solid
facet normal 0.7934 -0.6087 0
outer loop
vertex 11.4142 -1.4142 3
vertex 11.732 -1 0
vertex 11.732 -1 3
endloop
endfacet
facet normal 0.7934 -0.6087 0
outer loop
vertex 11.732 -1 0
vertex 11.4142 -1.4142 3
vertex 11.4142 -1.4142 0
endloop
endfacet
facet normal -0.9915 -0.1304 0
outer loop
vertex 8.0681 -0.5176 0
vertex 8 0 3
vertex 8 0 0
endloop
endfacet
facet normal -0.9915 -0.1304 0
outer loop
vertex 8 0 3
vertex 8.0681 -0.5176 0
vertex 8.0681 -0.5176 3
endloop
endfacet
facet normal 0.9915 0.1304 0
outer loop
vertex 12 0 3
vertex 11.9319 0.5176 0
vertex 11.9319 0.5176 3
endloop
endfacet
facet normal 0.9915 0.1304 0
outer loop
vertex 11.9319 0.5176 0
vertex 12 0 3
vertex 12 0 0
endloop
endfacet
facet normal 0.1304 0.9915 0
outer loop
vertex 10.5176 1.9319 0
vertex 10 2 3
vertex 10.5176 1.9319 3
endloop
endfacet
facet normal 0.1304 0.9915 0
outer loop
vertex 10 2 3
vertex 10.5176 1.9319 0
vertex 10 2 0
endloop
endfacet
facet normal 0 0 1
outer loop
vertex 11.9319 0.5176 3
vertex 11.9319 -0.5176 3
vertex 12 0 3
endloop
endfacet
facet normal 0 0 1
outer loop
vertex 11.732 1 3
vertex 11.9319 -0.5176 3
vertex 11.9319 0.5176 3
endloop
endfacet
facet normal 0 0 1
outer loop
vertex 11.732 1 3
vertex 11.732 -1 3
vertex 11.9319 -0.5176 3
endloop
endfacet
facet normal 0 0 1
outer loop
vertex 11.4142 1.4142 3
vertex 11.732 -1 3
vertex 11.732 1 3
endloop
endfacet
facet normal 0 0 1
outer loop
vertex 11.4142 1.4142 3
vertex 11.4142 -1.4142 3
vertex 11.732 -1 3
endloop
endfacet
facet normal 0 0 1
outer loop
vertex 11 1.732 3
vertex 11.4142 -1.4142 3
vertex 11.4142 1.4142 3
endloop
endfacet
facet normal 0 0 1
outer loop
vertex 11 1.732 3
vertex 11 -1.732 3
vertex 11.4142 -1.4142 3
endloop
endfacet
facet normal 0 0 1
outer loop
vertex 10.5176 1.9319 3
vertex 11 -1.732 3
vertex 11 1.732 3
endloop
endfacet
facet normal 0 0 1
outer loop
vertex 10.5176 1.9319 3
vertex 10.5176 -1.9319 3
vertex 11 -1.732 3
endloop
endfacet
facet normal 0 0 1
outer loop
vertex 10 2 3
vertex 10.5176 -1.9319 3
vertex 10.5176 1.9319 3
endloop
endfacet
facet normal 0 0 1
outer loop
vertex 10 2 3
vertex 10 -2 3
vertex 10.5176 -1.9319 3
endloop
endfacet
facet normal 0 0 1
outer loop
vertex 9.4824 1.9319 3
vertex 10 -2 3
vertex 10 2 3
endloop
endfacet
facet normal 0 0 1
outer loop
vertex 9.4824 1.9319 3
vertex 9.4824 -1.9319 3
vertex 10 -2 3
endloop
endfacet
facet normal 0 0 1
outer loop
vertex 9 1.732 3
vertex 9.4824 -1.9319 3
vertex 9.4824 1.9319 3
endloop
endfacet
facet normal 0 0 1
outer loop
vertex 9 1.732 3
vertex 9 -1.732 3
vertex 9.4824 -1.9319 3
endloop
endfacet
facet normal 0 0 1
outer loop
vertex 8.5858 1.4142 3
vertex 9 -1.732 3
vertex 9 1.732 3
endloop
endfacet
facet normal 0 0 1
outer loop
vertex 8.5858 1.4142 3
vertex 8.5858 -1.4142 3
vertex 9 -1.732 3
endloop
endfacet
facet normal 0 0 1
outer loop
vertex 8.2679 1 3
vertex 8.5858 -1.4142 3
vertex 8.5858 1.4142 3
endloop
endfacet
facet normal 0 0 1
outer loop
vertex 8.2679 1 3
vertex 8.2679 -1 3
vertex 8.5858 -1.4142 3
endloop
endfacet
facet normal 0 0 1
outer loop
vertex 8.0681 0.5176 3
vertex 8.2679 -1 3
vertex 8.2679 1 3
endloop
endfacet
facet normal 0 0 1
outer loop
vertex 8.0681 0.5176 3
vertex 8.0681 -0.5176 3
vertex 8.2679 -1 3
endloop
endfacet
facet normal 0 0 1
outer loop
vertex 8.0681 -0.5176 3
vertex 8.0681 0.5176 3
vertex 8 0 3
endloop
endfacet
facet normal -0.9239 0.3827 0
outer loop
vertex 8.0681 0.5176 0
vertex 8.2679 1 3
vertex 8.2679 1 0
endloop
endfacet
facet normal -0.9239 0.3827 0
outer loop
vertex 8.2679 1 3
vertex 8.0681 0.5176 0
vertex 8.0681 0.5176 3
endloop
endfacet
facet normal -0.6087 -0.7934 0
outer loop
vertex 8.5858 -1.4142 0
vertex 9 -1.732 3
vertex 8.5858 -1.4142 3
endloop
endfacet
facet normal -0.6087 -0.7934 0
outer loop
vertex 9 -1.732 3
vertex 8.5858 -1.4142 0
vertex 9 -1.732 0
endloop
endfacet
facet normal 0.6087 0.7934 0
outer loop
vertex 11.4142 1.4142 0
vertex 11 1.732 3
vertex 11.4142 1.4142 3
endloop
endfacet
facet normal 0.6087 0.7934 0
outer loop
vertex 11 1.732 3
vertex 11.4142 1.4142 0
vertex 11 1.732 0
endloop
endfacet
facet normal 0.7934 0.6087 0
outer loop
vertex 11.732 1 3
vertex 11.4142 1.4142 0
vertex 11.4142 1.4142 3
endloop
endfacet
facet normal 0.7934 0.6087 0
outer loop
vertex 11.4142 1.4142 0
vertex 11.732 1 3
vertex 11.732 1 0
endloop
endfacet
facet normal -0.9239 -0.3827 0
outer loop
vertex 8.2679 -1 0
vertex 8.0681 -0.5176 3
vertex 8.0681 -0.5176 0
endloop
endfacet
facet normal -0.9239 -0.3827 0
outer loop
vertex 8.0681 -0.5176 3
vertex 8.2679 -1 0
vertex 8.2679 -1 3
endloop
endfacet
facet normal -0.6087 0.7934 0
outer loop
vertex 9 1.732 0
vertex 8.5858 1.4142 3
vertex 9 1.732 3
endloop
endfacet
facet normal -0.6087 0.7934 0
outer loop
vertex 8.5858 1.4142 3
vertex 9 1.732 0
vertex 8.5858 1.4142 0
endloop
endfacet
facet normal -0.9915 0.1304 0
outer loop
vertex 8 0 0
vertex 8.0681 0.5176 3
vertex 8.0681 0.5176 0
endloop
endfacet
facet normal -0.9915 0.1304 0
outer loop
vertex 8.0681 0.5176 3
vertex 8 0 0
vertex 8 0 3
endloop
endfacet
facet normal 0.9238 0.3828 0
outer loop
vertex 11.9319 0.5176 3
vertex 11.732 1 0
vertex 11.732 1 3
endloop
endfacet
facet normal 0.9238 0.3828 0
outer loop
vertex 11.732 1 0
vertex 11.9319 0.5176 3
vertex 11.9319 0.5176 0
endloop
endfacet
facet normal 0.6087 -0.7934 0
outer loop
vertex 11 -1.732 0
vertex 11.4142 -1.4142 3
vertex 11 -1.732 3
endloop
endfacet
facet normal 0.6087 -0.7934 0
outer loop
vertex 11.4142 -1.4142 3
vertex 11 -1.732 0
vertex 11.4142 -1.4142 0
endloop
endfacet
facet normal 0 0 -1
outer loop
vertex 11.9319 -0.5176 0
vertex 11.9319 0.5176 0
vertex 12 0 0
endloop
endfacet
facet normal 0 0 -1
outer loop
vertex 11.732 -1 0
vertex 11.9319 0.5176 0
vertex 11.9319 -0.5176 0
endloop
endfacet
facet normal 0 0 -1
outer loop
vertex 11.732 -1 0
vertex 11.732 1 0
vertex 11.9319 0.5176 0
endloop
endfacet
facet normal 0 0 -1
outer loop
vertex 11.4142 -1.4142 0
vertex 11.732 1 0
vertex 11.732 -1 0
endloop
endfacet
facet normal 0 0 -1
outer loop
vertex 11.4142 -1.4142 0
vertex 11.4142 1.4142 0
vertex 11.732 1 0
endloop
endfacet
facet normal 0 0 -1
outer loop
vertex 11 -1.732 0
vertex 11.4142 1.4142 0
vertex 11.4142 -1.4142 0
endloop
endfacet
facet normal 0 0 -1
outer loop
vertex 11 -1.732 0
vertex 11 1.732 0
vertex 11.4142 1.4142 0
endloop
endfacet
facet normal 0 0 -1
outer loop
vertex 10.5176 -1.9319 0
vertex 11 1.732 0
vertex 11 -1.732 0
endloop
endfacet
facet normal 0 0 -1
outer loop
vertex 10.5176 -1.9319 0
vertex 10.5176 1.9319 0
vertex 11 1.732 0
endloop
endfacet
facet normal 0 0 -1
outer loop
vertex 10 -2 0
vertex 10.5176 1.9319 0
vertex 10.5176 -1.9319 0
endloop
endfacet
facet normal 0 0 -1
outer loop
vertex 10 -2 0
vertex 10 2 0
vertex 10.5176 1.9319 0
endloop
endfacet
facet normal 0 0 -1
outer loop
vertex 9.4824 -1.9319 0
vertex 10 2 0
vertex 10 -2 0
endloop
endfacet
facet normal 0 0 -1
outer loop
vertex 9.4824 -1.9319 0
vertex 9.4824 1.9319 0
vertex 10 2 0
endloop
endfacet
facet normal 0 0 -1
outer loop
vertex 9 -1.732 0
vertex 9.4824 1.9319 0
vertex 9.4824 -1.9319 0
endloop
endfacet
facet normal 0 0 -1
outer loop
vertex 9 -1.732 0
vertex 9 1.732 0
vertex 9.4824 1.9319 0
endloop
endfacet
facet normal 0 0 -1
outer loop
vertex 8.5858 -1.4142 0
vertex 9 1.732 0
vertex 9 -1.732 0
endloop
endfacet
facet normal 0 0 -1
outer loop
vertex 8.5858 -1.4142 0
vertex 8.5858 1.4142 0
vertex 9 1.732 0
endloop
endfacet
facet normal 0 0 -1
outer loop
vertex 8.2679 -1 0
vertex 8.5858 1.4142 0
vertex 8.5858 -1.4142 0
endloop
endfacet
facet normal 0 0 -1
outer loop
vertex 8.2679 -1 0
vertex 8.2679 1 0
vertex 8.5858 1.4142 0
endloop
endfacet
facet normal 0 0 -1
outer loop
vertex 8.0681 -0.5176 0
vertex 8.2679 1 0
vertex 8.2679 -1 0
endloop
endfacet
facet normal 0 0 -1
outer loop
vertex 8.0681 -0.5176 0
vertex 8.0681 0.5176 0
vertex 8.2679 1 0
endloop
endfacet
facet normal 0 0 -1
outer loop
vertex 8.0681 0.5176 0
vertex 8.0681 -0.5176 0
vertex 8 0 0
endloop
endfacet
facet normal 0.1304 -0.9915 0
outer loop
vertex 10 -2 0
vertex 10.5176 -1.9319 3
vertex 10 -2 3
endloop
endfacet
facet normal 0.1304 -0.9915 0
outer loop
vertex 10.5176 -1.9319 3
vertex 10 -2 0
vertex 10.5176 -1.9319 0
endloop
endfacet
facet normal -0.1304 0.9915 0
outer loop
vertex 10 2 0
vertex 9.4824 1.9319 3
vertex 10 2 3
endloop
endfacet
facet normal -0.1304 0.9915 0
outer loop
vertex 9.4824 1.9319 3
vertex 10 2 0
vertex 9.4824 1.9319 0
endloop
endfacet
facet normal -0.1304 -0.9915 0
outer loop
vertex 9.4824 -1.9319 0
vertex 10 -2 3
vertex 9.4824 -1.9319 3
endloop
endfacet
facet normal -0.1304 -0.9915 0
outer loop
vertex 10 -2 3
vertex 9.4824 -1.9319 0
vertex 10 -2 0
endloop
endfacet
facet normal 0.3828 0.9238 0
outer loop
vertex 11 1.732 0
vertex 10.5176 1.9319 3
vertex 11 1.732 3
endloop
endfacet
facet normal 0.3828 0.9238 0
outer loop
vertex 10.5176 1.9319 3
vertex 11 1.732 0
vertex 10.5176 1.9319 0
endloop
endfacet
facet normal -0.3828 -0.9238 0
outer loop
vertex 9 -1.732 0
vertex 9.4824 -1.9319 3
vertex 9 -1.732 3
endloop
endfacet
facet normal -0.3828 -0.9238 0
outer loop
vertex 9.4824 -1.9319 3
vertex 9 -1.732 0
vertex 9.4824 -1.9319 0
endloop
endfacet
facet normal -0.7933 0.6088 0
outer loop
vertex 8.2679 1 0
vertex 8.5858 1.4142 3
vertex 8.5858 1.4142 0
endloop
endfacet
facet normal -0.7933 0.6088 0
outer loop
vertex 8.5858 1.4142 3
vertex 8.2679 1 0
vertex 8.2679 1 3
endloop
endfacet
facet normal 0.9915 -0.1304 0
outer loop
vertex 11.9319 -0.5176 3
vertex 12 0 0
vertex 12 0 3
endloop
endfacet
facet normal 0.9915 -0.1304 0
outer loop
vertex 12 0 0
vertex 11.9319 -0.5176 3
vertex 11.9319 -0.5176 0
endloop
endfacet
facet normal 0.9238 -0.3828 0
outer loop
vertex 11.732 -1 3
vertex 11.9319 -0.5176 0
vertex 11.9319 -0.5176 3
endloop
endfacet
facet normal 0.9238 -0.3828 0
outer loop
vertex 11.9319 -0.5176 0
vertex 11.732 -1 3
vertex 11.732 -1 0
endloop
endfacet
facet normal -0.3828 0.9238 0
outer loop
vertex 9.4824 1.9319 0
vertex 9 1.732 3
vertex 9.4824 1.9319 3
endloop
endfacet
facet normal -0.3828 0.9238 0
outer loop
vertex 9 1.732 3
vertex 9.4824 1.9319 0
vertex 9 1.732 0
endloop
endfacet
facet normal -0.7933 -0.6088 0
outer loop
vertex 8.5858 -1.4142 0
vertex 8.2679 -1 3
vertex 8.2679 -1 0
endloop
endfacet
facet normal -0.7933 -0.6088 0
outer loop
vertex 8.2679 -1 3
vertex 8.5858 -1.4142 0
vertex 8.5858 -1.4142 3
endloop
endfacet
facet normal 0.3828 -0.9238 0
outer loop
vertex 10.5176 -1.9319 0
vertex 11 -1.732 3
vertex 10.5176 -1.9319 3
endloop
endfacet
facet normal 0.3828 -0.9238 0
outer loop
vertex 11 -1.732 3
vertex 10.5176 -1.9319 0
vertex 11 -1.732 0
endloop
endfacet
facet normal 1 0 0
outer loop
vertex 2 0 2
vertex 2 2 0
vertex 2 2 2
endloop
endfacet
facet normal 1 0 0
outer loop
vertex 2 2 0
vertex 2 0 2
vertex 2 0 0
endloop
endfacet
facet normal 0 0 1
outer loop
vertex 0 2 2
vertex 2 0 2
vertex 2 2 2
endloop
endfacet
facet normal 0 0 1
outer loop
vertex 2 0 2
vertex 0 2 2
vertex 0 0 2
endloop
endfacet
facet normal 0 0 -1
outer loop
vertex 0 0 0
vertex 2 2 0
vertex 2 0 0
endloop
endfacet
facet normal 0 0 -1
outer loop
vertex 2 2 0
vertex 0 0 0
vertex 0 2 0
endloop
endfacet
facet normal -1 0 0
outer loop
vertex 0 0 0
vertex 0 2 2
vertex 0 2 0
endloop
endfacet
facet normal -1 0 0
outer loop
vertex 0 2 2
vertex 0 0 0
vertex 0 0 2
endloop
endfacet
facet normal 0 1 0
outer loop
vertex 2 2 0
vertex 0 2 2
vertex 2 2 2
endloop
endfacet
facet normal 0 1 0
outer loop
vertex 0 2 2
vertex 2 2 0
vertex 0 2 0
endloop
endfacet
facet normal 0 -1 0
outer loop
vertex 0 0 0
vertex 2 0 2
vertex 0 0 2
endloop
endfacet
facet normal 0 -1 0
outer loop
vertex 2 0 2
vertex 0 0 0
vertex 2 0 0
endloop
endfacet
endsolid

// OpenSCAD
// file: lib/pegs.scad
// A small library, pulled in by include.scad (`include`) and use.scad
// (`use`). Run on its own it renders its demo peg.

// File-scope variable: visible to this file's functions and modules even
// when the file is `use`d, but never to the file that uses it.
peg_radius = 2;

function peg_double(x) = x * 2;
function peg_default_radius() = peg_radius;

module peg(h = 4, r = peg_radius) cylinder(h = h, r = r, $fn = 24);

// Demo geometry: part of the model when this file is included or run
// directly, never when it is used.
peg(1);
// main file
// use <file>: only the library's modules and functions are imported. Its
// demo peg is not rendered and `peg_radius` is not defined here, though the
// library's own functions and modules still see it.
use <lib/pegs.scad>

assert(is_undef(peg_radius), "use must not import variables");
translate([peg_double(5), 0, 0]) peg(h = 3, r = peg_default_radius());
cube(2);
